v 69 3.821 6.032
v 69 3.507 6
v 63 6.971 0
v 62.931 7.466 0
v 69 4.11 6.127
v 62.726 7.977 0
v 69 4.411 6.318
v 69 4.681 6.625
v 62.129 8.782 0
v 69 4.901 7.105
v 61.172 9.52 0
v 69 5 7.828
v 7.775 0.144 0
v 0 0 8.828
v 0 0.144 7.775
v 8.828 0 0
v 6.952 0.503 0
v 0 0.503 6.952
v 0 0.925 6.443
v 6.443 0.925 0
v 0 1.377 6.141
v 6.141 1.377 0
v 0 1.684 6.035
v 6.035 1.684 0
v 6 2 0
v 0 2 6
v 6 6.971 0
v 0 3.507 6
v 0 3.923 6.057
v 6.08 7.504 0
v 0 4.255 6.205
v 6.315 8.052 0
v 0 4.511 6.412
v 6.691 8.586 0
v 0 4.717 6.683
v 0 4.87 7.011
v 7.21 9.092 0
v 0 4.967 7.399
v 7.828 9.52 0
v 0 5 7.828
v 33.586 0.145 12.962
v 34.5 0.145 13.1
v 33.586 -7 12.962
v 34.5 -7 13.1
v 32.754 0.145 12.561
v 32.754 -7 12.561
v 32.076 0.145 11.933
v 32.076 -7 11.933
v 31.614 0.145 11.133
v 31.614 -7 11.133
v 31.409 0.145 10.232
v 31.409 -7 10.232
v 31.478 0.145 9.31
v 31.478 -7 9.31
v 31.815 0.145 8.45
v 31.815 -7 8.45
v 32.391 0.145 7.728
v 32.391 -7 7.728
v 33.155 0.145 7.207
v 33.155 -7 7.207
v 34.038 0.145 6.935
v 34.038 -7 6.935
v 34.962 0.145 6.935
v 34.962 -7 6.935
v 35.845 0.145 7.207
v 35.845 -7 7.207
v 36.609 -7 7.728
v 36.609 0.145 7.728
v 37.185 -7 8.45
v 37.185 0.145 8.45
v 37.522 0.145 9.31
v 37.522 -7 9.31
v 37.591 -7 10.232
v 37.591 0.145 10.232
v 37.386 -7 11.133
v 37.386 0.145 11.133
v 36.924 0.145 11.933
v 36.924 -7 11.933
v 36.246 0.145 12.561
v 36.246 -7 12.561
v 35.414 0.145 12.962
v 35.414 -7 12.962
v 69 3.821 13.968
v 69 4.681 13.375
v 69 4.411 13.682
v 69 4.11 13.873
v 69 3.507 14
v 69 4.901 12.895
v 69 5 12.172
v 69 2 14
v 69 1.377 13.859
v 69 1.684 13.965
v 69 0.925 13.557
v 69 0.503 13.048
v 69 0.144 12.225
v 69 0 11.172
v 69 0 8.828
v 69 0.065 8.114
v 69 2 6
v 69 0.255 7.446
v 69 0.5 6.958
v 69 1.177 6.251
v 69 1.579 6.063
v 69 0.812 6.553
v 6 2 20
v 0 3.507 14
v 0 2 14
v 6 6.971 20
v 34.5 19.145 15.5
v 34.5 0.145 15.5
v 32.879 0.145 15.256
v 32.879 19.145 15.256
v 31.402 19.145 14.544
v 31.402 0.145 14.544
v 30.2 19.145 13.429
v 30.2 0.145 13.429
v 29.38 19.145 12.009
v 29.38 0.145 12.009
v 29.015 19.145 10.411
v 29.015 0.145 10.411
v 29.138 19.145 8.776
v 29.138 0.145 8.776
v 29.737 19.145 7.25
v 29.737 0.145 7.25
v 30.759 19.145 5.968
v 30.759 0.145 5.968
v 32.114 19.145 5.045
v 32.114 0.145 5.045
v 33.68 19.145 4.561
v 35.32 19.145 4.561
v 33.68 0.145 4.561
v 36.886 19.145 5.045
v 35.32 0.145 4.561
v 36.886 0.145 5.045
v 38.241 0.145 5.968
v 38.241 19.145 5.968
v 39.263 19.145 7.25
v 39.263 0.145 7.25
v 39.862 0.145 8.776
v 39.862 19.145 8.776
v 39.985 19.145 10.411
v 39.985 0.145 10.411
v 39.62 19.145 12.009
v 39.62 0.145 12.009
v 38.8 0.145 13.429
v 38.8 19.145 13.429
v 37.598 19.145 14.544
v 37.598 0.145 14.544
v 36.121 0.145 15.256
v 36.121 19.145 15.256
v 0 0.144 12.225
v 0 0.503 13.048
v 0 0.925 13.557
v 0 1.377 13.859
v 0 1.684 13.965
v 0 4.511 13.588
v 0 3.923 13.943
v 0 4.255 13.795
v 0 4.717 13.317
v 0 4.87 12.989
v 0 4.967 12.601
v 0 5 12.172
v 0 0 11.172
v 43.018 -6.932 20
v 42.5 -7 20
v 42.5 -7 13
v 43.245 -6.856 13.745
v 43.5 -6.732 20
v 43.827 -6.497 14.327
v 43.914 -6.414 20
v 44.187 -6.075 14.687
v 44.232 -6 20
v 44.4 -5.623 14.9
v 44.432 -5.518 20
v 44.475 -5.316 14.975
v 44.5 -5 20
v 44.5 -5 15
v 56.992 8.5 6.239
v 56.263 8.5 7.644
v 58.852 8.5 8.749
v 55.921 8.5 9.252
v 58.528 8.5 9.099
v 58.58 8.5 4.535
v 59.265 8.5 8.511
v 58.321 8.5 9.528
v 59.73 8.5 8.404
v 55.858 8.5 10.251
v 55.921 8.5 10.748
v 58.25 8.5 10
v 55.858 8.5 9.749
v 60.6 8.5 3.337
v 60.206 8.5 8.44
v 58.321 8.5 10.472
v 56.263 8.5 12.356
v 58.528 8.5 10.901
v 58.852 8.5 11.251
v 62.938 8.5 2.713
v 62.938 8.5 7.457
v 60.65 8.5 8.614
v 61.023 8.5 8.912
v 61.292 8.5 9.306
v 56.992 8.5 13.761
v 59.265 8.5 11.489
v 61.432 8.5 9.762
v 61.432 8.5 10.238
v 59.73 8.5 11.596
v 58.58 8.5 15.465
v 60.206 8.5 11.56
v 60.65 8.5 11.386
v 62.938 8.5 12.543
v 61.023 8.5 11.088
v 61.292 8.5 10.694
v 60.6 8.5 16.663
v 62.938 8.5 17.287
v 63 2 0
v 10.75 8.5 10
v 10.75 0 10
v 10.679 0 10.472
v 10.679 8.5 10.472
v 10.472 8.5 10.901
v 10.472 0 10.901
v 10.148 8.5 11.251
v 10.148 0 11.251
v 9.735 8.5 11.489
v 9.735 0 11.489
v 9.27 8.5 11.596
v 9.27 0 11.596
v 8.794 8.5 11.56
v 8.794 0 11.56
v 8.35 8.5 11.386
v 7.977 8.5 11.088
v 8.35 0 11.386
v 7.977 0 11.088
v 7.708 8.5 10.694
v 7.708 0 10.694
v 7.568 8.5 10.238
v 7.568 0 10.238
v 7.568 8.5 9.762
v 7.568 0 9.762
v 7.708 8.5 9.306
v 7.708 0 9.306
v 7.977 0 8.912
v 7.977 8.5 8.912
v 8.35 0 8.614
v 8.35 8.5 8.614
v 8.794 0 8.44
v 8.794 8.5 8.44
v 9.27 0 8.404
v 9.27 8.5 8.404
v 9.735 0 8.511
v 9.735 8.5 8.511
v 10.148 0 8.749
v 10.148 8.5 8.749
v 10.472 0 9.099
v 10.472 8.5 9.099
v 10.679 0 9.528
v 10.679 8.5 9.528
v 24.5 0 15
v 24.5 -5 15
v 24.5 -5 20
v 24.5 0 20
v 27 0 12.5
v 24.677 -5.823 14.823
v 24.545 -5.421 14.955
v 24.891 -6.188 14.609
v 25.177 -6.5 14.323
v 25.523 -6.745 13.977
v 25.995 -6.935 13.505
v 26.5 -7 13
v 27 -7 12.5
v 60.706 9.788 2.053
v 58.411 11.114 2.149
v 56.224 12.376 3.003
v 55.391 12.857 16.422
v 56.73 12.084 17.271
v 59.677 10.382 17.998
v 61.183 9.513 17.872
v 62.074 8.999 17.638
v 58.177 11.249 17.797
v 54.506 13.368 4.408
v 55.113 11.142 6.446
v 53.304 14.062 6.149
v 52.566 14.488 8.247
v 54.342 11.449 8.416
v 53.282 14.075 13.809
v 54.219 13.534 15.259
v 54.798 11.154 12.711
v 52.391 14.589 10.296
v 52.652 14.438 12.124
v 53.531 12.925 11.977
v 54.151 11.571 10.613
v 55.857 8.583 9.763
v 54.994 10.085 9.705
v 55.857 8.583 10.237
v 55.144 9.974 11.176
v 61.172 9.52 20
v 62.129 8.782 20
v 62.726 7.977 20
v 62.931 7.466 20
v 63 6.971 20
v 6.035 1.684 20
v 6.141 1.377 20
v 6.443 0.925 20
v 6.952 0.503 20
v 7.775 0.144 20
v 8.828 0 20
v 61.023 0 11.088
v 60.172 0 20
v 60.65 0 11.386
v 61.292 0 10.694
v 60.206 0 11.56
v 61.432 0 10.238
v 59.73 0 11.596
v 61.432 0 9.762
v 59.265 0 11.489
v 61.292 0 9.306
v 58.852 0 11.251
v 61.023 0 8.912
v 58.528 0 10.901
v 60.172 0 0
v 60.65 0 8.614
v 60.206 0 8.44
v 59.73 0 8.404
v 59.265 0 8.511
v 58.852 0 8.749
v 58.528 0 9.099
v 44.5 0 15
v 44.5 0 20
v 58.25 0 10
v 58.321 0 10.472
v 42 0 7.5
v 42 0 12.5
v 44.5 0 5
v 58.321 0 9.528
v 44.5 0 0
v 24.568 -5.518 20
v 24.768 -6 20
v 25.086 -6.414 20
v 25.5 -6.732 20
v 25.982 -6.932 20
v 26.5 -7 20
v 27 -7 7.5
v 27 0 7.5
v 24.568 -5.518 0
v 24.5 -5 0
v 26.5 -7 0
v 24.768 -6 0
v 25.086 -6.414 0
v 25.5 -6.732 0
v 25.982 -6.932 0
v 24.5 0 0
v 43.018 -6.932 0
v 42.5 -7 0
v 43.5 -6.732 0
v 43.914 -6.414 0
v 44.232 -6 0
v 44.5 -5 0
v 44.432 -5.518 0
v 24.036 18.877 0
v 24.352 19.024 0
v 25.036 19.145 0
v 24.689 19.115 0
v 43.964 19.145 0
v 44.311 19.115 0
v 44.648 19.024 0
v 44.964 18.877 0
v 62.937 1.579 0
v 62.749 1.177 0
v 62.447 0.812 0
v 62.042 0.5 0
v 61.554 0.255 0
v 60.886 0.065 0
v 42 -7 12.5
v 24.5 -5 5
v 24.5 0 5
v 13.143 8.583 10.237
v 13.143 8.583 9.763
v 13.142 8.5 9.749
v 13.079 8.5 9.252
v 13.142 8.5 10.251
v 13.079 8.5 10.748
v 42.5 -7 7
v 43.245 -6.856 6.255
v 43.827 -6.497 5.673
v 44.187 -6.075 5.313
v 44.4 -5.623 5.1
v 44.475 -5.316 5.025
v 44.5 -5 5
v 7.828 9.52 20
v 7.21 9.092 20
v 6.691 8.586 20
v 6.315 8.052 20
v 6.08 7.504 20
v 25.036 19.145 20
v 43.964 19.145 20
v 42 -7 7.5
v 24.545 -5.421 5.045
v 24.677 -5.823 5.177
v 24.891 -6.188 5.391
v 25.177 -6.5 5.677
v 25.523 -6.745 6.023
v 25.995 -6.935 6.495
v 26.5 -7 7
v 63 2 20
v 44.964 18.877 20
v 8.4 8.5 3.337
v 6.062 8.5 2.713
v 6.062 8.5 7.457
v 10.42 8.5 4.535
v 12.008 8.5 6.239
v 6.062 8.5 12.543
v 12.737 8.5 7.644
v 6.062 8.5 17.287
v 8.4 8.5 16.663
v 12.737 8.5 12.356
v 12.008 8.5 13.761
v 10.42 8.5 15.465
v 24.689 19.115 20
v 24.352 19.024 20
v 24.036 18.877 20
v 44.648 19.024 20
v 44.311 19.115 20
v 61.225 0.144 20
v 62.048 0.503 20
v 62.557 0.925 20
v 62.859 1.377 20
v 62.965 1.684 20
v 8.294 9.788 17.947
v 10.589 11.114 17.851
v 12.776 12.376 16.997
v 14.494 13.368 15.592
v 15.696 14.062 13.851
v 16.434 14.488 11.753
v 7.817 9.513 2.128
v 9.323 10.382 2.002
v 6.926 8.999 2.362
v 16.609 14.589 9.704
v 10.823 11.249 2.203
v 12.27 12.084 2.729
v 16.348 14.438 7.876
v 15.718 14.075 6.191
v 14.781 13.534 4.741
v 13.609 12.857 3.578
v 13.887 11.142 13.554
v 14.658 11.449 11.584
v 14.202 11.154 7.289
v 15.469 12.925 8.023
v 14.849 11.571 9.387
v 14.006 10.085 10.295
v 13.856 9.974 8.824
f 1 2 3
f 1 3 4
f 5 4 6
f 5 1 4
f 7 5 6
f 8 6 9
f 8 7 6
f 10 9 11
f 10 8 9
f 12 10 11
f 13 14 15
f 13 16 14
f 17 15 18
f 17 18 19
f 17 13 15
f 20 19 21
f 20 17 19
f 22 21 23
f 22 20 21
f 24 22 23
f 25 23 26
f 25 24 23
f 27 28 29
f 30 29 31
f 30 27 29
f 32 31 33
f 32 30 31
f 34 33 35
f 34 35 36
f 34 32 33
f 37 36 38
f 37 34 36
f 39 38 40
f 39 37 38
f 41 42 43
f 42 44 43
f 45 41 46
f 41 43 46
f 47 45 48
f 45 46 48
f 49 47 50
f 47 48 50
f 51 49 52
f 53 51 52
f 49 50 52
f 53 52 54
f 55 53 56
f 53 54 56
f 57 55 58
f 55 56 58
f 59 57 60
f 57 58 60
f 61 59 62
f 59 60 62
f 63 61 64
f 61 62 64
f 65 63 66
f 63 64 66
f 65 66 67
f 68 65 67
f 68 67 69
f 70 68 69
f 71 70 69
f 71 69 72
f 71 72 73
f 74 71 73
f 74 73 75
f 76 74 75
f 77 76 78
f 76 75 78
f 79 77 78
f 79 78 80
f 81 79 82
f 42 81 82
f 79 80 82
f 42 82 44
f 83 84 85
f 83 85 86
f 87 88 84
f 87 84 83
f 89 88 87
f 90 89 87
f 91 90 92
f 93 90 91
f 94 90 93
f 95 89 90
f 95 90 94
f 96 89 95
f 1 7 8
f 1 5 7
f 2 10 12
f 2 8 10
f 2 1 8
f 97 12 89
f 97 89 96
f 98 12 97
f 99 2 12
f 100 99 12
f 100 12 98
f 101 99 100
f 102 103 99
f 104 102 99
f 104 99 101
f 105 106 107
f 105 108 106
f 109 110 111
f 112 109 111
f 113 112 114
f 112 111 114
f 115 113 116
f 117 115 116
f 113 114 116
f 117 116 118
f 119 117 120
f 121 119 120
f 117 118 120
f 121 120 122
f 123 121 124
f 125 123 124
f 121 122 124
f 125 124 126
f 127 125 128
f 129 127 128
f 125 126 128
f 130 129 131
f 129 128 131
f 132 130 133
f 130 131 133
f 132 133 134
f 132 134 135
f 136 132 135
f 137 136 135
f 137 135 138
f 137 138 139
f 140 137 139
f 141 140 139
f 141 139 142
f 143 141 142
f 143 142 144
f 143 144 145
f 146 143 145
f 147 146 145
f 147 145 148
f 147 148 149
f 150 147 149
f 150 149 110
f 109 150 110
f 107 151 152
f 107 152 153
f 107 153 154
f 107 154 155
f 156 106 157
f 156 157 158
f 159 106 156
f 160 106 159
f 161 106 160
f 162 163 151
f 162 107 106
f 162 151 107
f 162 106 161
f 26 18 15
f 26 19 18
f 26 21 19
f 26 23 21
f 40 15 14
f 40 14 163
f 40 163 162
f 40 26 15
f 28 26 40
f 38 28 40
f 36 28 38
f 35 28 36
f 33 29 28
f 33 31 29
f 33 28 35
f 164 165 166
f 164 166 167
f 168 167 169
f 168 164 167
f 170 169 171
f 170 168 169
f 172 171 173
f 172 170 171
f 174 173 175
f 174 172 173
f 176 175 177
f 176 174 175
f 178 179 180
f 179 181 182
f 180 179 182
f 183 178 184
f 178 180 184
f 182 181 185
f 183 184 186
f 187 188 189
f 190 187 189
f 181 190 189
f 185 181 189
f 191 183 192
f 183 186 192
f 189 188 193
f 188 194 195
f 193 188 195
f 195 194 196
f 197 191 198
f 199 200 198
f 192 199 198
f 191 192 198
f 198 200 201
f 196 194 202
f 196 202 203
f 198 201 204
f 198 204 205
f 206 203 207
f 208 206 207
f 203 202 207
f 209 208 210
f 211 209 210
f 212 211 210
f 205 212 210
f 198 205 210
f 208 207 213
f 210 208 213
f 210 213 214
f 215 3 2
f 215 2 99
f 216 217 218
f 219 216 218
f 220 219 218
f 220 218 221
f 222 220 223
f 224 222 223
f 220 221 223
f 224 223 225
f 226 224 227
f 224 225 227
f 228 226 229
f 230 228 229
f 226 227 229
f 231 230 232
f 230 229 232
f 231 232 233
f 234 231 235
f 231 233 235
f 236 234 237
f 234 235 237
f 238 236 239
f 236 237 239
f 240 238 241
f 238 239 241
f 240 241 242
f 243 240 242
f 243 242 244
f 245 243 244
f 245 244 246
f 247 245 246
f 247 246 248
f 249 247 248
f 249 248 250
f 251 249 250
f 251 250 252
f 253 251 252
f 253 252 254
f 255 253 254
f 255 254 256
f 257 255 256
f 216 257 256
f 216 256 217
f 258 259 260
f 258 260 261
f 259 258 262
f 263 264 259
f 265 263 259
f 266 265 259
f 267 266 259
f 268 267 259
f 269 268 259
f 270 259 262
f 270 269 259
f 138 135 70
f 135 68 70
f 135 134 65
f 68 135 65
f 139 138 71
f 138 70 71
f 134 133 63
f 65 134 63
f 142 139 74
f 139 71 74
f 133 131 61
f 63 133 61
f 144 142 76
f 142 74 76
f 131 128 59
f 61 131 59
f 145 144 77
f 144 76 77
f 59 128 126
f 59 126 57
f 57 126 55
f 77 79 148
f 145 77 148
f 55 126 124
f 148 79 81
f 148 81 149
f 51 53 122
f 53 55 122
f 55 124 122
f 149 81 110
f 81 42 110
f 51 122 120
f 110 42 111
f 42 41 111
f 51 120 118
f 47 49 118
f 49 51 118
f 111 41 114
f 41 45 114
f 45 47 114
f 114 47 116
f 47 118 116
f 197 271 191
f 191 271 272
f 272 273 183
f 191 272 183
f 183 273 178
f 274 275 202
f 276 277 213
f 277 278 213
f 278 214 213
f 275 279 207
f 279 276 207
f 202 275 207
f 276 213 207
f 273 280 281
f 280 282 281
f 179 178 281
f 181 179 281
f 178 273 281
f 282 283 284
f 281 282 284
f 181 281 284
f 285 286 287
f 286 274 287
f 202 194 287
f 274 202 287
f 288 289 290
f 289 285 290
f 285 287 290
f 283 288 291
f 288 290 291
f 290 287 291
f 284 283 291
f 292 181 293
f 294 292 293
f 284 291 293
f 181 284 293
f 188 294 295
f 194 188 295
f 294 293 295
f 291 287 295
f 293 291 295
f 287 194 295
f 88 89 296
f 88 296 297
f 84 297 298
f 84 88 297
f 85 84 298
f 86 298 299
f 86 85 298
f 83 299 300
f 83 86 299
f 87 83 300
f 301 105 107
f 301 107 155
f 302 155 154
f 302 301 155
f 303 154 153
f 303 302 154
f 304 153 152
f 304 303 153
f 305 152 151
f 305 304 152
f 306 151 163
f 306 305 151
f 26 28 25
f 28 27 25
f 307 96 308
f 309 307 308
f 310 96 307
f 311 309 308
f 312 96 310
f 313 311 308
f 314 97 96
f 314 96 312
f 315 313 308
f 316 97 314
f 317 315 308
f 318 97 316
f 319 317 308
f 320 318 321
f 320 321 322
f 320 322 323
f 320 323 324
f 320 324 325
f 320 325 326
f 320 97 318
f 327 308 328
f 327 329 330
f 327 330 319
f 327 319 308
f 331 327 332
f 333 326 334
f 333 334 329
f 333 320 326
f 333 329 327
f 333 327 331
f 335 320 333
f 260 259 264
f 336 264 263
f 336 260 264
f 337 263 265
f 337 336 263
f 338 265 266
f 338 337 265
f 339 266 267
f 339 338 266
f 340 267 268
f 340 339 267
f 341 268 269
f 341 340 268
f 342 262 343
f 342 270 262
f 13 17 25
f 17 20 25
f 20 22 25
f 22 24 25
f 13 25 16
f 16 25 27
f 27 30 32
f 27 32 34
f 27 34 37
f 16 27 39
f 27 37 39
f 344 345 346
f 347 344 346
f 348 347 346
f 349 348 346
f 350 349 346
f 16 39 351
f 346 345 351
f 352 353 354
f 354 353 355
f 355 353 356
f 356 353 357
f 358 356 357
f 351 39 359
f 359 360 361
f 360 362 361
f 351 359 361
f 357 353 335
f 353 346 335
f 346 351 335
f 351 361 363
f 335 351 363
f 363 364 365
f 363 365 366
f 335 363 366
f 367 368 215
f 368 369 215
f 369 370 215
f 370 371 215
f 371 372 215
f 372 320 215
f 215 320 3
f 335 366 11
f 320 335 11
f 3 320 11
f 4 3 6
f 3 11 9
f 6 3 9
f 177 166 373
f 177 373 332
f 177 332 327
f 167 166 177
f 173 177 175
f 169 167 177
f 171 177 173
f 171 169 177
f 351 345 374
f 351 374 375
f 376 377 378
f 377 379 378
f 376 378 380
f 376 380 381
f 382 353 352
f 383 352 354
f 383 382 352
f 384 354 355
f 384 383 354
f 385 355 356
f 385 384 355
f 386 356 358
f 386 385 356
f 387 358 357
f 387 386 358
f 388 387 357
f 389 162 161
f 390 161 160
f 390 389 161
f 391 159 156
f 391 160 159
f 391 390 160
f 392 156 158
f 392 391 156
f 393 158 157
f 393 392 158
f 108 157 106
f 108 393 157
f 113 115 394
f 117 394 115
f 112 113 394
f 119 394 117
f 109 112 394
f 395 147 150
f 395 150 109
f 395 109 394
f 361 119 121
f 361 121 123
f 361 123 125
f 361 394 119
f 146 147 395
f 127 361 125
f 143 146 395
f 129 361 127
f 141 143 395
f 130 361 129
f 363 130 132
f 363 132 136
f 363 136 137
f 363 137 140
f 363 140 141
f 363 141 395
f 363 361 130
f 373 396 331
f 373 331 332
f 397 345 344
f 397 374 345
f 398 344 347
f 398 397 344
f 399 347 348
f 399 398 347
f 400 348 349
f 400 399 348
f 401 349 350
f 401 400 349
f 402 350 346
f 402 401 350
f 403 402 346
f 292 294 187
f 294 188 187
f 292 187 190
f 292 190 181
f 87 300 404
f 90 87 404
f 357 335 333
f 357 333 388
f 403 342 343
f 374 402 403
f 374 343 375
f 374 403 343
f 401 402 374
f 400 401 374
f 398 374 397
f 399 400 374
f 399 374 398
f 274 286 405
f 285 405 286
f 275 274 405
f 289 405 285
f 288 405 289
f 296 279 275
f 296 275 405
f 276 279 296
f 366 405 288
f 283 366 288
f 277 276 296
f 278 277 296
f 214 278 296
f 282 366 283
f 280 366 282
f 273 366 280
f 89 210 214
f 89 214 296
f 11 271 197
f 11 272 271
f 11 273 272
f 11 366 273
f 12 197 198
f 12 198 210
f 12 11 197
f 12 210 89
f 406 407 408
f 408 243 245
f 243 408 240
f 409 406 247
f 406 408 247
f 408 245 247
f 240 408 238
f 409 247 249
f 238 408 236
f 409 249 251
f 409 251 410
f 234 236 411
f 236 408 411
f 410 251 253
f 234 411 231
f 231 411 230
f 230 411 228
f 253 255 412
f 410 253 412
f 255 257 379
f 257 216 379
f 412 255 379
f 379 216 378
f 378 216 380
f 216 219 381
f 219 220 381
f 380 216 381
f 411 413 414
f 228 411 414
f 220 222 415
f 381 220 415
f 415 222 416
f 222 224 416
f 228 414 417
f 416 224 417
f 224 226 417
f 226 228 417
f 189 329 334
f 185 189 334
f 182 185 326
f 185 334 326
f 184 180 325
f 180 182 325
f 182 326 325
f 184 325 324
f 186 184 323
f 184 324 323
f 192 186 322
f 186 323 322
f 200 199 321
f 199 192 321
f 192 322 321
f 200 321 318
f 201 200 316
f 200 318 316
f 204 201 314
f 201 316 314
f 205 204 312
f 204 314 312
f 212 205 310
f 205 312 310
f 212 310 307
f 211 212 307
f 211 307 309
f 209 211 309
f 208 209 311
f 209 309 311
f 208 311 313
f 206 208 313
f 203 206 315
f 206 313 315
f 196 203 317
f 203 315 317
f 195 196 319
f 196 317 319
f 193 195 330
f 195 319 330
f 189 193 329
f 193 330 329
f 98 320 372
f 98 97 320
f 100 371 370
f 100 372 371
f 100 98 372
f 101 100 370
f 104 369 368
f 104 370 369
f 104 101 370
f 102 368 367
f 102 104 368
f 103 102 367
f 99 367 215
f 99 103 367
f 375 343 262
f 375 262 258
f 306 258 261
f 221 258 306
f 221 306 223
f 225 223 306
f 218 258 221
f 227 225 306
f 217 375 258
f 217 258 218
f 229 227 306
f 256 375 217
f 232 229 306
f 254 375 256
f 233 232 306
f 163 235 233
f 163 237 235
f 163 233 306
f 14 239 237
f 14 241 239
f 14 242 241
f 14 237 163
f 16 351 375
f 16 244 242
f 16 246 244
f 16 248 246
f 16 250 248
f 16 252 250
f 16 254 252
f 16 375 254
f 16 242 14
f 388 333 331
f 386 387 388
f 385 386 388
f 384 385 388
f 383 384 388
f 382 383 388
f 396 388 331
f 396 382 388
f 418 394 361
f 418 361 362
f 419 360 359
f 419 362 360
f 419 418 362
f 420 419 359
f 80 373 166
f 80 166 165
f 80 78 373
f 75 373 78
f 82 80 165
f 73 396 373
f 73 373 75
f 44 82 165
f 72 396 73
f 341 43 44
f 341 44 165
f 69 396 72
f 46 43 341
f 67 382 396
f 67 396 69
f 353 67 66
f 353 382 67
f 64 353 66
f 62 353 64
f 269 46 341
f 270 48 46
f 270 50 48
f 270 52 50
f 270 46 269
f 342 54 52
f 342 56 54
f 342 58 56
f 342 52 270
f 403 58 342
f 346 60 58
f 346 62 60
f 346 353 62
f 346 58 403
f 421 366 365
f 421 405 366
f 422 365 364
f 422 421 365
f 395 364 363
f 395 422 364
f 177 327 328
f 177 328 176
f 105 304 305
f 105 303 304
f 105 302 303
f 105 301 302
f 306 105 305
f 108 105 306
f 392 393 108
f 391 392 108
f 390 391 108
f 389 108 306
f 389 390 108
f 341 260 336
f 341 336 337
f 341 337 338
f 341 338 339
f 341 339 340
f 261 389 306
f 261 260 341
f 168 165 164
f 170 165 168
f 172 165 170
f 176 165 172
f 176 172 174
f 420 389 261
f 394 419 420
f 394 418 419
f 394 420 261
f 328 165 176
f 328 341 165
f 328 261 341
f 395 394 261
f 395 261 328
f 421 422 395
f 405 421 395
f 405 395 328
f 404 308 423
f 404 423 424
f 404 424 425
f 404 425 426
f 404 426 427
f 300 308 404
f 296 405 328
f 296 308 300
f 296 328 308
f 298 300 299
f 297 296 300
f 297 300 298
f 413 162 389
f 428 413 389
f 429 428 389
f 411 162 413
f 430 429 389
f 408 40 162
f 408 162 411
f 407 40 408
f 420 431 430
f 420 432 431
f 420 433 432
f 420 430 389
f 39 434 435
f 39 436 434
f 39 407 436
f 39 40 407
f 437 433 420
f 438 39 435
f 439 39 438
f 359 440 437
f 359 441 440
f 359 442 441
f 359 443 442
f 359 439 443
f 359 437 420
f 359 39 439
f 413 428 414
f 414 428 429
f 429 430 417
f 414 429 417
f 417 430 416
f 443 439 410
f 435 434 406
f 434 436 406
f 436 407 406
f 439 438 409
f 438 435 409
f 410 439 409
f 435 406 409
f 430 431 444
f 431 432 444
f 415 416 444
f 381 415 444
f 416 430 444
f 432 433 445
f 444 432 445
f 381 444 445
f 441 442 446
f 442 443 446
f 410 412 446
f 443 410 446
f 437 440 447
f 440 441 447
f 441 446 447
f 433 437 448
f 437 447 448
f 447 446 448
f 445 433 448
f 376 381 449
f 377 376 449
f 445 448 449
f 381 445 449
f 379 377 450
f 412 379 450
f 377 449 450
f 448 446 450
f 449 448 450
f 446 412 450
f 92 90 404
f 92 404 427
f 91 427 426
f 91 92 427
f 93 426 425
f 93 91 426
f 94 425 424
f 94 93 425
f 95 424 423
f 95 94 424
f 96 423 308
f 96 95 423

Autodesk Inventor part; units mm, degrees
ref_plane "YZ Plane" through (0, 0, 0) normal (1, 0, 0) x (0, 1, 0)
ref_plane "XZ Plane" through (0, 0, 0) normal (0, 1, 0) x (-1, 0, 0)
sketch "Sketch1" plane through (0, 0, 0) normal (0, 0, 1) x (1, 0, 0)
  line L0 (0, 0) -> (0, 5)
  line L1 (0, 5) -> (24.5, 19.1451)
  line L2 (24.5, 19.1451) -> (44.5, 19.1451)
  line L3 (44.5, 19.1451) -> (69, 5)
  line L4 (69, 5) -> (69, 0)
  line L5 (69, 0) -> (44.5, 0)
  line L6 (44.5, 0) -> (44.5, -7)
  line L7 (44.5, -7) -> (24.5, -7)
  line L8 (24.5, -7) -> (24.5, 0)
  line L9 (24.5, 0) -> (0, 0)
  dimension "d0" = 20
  dimension "d1" = 7
  dimension "d2" = 5
  dimension "d3" = 24.5
  dimension "d4" = 120
  dimension "d5" = 120
  dimension "d6" = 20
extrude "Extrusion1" add sketch "Sketch1" along normal blind 20
sketch "Sketch2" plane through (24.5, -7, 0) normal (0, -1, 0) x (1, 0, 0)
  line L0 (0, 0) -> (20, 0) projected
  line L1 (20, 0) -> (20, 20) projected
  line L2 (0, 20) -> (20, 20) projected
  line L3 (0, 0) -> (0, 20) projected
  line L4 (0, 15) -> (2.5, 12.5)
  line L5 (2.5, 12.5) -> (2.5, 7.5)
  line L6 (2.5, 7.5) -> (0, 5)
  point P0 (-24.5, 0)
  point P1 (0, 10)
  point P2 (2.5, 10)
  dimension "d9" = 135
  dimension "d10" = 135
  dimension "d11" = 10
  dimension "d12" = 2.5
extrude "Extrusion2" cut sketch "Sketch2" against normal up to surface (7 mm away) contours L3 L4 L5 L6
ref_plane "Work Plane1" through (34.5, -7, 20) normal (-1, 0, 0) x (0, 0, 1)
sketch "Sketch3" plane through (0, 0, 0) normal (0, -1, 0) x (1, 0, 0)
  line L0 (24.5, 15) -> (24.5, 20) projected
  line L1 (0, 0) -> (0, 20) projected
  circle A0 centre (9.15, 10) radius 4
  circle A1 centre (9.15, 10) radius 1.6
  point P0 (0, 10)
  dimension "d15" = 15.35
  dimension "d16" = 3.2
  dimension "d17" = 8
extrude "Extrusion3" cut sketch "Sketch3" against normal through all contours A1
ref_plane "Work Plane2" through (0, 8.5, 0) normal (0, -1, 0) x (1, 0, 0)
extrude "Extrusion4" cut sketch "Sketch3" against normal blind 10 from surface at -8.5
sketch "Sketch4" plane through (24.5, 19.1451, 0) normal (0, 1, 0) x (1, 0, 0)
  line L0 (20, 0) -> (0, 0) projected
  line L1 (0, 0) -> (0, -20) projected
  line L2 (20, -20) -> (0, -20) projected
  line L3 (20, 0) -> (20, -20) projected
  point P0 (-24.5, 0)
  point P1 (10, -10)
  point P2 (20, -10)
  point P3 (10, -20)
hole "Hole1" at (34.5, 19.1451, 10) direction (0, -1, 0) diameter 6.2 end through all counterbore diameter 11 counterbore depth 19
mirror "Mirror1" about plane through (34.5, -7, 20) normal (-1, 0, 0) of "Extrusion2", "Extrusion3", "Extrusion4"
chamfer "Chamfer1" distance 6 angle 45 4 edges at (0, 2.5, 0) (0, 2.5, 20) (69, 2.5, 20) (69, 2.5, 0)
fillet "Fillet1" radius 2 14 edges at (3, 0, 3) (24.5, -7, 2.5) (24.5, -7, 17.5) (3, 0, 17) (3, 6.7321, 17) (3, 6.7321, 3) (24.5, 19.1451, 10) (44.5, -7, 17.5) (44.5, -7, 2.5) (66, 6.7321, 17) (66, 0, 17) (66, 6.7321, 3) (66, 0, 3) (44.5, 19.1451, 10)
chamfer "Chamfer2" distance 4 angle 45 4 edges at (58.4993, 11.0626, 13.7651) (58.4993, 11.0626, 6.2349) (10.5007, 11.0626, 6.2349) (10.5007, 11.0626, 13.7651)
properties part number "Belt tensioner mount"
